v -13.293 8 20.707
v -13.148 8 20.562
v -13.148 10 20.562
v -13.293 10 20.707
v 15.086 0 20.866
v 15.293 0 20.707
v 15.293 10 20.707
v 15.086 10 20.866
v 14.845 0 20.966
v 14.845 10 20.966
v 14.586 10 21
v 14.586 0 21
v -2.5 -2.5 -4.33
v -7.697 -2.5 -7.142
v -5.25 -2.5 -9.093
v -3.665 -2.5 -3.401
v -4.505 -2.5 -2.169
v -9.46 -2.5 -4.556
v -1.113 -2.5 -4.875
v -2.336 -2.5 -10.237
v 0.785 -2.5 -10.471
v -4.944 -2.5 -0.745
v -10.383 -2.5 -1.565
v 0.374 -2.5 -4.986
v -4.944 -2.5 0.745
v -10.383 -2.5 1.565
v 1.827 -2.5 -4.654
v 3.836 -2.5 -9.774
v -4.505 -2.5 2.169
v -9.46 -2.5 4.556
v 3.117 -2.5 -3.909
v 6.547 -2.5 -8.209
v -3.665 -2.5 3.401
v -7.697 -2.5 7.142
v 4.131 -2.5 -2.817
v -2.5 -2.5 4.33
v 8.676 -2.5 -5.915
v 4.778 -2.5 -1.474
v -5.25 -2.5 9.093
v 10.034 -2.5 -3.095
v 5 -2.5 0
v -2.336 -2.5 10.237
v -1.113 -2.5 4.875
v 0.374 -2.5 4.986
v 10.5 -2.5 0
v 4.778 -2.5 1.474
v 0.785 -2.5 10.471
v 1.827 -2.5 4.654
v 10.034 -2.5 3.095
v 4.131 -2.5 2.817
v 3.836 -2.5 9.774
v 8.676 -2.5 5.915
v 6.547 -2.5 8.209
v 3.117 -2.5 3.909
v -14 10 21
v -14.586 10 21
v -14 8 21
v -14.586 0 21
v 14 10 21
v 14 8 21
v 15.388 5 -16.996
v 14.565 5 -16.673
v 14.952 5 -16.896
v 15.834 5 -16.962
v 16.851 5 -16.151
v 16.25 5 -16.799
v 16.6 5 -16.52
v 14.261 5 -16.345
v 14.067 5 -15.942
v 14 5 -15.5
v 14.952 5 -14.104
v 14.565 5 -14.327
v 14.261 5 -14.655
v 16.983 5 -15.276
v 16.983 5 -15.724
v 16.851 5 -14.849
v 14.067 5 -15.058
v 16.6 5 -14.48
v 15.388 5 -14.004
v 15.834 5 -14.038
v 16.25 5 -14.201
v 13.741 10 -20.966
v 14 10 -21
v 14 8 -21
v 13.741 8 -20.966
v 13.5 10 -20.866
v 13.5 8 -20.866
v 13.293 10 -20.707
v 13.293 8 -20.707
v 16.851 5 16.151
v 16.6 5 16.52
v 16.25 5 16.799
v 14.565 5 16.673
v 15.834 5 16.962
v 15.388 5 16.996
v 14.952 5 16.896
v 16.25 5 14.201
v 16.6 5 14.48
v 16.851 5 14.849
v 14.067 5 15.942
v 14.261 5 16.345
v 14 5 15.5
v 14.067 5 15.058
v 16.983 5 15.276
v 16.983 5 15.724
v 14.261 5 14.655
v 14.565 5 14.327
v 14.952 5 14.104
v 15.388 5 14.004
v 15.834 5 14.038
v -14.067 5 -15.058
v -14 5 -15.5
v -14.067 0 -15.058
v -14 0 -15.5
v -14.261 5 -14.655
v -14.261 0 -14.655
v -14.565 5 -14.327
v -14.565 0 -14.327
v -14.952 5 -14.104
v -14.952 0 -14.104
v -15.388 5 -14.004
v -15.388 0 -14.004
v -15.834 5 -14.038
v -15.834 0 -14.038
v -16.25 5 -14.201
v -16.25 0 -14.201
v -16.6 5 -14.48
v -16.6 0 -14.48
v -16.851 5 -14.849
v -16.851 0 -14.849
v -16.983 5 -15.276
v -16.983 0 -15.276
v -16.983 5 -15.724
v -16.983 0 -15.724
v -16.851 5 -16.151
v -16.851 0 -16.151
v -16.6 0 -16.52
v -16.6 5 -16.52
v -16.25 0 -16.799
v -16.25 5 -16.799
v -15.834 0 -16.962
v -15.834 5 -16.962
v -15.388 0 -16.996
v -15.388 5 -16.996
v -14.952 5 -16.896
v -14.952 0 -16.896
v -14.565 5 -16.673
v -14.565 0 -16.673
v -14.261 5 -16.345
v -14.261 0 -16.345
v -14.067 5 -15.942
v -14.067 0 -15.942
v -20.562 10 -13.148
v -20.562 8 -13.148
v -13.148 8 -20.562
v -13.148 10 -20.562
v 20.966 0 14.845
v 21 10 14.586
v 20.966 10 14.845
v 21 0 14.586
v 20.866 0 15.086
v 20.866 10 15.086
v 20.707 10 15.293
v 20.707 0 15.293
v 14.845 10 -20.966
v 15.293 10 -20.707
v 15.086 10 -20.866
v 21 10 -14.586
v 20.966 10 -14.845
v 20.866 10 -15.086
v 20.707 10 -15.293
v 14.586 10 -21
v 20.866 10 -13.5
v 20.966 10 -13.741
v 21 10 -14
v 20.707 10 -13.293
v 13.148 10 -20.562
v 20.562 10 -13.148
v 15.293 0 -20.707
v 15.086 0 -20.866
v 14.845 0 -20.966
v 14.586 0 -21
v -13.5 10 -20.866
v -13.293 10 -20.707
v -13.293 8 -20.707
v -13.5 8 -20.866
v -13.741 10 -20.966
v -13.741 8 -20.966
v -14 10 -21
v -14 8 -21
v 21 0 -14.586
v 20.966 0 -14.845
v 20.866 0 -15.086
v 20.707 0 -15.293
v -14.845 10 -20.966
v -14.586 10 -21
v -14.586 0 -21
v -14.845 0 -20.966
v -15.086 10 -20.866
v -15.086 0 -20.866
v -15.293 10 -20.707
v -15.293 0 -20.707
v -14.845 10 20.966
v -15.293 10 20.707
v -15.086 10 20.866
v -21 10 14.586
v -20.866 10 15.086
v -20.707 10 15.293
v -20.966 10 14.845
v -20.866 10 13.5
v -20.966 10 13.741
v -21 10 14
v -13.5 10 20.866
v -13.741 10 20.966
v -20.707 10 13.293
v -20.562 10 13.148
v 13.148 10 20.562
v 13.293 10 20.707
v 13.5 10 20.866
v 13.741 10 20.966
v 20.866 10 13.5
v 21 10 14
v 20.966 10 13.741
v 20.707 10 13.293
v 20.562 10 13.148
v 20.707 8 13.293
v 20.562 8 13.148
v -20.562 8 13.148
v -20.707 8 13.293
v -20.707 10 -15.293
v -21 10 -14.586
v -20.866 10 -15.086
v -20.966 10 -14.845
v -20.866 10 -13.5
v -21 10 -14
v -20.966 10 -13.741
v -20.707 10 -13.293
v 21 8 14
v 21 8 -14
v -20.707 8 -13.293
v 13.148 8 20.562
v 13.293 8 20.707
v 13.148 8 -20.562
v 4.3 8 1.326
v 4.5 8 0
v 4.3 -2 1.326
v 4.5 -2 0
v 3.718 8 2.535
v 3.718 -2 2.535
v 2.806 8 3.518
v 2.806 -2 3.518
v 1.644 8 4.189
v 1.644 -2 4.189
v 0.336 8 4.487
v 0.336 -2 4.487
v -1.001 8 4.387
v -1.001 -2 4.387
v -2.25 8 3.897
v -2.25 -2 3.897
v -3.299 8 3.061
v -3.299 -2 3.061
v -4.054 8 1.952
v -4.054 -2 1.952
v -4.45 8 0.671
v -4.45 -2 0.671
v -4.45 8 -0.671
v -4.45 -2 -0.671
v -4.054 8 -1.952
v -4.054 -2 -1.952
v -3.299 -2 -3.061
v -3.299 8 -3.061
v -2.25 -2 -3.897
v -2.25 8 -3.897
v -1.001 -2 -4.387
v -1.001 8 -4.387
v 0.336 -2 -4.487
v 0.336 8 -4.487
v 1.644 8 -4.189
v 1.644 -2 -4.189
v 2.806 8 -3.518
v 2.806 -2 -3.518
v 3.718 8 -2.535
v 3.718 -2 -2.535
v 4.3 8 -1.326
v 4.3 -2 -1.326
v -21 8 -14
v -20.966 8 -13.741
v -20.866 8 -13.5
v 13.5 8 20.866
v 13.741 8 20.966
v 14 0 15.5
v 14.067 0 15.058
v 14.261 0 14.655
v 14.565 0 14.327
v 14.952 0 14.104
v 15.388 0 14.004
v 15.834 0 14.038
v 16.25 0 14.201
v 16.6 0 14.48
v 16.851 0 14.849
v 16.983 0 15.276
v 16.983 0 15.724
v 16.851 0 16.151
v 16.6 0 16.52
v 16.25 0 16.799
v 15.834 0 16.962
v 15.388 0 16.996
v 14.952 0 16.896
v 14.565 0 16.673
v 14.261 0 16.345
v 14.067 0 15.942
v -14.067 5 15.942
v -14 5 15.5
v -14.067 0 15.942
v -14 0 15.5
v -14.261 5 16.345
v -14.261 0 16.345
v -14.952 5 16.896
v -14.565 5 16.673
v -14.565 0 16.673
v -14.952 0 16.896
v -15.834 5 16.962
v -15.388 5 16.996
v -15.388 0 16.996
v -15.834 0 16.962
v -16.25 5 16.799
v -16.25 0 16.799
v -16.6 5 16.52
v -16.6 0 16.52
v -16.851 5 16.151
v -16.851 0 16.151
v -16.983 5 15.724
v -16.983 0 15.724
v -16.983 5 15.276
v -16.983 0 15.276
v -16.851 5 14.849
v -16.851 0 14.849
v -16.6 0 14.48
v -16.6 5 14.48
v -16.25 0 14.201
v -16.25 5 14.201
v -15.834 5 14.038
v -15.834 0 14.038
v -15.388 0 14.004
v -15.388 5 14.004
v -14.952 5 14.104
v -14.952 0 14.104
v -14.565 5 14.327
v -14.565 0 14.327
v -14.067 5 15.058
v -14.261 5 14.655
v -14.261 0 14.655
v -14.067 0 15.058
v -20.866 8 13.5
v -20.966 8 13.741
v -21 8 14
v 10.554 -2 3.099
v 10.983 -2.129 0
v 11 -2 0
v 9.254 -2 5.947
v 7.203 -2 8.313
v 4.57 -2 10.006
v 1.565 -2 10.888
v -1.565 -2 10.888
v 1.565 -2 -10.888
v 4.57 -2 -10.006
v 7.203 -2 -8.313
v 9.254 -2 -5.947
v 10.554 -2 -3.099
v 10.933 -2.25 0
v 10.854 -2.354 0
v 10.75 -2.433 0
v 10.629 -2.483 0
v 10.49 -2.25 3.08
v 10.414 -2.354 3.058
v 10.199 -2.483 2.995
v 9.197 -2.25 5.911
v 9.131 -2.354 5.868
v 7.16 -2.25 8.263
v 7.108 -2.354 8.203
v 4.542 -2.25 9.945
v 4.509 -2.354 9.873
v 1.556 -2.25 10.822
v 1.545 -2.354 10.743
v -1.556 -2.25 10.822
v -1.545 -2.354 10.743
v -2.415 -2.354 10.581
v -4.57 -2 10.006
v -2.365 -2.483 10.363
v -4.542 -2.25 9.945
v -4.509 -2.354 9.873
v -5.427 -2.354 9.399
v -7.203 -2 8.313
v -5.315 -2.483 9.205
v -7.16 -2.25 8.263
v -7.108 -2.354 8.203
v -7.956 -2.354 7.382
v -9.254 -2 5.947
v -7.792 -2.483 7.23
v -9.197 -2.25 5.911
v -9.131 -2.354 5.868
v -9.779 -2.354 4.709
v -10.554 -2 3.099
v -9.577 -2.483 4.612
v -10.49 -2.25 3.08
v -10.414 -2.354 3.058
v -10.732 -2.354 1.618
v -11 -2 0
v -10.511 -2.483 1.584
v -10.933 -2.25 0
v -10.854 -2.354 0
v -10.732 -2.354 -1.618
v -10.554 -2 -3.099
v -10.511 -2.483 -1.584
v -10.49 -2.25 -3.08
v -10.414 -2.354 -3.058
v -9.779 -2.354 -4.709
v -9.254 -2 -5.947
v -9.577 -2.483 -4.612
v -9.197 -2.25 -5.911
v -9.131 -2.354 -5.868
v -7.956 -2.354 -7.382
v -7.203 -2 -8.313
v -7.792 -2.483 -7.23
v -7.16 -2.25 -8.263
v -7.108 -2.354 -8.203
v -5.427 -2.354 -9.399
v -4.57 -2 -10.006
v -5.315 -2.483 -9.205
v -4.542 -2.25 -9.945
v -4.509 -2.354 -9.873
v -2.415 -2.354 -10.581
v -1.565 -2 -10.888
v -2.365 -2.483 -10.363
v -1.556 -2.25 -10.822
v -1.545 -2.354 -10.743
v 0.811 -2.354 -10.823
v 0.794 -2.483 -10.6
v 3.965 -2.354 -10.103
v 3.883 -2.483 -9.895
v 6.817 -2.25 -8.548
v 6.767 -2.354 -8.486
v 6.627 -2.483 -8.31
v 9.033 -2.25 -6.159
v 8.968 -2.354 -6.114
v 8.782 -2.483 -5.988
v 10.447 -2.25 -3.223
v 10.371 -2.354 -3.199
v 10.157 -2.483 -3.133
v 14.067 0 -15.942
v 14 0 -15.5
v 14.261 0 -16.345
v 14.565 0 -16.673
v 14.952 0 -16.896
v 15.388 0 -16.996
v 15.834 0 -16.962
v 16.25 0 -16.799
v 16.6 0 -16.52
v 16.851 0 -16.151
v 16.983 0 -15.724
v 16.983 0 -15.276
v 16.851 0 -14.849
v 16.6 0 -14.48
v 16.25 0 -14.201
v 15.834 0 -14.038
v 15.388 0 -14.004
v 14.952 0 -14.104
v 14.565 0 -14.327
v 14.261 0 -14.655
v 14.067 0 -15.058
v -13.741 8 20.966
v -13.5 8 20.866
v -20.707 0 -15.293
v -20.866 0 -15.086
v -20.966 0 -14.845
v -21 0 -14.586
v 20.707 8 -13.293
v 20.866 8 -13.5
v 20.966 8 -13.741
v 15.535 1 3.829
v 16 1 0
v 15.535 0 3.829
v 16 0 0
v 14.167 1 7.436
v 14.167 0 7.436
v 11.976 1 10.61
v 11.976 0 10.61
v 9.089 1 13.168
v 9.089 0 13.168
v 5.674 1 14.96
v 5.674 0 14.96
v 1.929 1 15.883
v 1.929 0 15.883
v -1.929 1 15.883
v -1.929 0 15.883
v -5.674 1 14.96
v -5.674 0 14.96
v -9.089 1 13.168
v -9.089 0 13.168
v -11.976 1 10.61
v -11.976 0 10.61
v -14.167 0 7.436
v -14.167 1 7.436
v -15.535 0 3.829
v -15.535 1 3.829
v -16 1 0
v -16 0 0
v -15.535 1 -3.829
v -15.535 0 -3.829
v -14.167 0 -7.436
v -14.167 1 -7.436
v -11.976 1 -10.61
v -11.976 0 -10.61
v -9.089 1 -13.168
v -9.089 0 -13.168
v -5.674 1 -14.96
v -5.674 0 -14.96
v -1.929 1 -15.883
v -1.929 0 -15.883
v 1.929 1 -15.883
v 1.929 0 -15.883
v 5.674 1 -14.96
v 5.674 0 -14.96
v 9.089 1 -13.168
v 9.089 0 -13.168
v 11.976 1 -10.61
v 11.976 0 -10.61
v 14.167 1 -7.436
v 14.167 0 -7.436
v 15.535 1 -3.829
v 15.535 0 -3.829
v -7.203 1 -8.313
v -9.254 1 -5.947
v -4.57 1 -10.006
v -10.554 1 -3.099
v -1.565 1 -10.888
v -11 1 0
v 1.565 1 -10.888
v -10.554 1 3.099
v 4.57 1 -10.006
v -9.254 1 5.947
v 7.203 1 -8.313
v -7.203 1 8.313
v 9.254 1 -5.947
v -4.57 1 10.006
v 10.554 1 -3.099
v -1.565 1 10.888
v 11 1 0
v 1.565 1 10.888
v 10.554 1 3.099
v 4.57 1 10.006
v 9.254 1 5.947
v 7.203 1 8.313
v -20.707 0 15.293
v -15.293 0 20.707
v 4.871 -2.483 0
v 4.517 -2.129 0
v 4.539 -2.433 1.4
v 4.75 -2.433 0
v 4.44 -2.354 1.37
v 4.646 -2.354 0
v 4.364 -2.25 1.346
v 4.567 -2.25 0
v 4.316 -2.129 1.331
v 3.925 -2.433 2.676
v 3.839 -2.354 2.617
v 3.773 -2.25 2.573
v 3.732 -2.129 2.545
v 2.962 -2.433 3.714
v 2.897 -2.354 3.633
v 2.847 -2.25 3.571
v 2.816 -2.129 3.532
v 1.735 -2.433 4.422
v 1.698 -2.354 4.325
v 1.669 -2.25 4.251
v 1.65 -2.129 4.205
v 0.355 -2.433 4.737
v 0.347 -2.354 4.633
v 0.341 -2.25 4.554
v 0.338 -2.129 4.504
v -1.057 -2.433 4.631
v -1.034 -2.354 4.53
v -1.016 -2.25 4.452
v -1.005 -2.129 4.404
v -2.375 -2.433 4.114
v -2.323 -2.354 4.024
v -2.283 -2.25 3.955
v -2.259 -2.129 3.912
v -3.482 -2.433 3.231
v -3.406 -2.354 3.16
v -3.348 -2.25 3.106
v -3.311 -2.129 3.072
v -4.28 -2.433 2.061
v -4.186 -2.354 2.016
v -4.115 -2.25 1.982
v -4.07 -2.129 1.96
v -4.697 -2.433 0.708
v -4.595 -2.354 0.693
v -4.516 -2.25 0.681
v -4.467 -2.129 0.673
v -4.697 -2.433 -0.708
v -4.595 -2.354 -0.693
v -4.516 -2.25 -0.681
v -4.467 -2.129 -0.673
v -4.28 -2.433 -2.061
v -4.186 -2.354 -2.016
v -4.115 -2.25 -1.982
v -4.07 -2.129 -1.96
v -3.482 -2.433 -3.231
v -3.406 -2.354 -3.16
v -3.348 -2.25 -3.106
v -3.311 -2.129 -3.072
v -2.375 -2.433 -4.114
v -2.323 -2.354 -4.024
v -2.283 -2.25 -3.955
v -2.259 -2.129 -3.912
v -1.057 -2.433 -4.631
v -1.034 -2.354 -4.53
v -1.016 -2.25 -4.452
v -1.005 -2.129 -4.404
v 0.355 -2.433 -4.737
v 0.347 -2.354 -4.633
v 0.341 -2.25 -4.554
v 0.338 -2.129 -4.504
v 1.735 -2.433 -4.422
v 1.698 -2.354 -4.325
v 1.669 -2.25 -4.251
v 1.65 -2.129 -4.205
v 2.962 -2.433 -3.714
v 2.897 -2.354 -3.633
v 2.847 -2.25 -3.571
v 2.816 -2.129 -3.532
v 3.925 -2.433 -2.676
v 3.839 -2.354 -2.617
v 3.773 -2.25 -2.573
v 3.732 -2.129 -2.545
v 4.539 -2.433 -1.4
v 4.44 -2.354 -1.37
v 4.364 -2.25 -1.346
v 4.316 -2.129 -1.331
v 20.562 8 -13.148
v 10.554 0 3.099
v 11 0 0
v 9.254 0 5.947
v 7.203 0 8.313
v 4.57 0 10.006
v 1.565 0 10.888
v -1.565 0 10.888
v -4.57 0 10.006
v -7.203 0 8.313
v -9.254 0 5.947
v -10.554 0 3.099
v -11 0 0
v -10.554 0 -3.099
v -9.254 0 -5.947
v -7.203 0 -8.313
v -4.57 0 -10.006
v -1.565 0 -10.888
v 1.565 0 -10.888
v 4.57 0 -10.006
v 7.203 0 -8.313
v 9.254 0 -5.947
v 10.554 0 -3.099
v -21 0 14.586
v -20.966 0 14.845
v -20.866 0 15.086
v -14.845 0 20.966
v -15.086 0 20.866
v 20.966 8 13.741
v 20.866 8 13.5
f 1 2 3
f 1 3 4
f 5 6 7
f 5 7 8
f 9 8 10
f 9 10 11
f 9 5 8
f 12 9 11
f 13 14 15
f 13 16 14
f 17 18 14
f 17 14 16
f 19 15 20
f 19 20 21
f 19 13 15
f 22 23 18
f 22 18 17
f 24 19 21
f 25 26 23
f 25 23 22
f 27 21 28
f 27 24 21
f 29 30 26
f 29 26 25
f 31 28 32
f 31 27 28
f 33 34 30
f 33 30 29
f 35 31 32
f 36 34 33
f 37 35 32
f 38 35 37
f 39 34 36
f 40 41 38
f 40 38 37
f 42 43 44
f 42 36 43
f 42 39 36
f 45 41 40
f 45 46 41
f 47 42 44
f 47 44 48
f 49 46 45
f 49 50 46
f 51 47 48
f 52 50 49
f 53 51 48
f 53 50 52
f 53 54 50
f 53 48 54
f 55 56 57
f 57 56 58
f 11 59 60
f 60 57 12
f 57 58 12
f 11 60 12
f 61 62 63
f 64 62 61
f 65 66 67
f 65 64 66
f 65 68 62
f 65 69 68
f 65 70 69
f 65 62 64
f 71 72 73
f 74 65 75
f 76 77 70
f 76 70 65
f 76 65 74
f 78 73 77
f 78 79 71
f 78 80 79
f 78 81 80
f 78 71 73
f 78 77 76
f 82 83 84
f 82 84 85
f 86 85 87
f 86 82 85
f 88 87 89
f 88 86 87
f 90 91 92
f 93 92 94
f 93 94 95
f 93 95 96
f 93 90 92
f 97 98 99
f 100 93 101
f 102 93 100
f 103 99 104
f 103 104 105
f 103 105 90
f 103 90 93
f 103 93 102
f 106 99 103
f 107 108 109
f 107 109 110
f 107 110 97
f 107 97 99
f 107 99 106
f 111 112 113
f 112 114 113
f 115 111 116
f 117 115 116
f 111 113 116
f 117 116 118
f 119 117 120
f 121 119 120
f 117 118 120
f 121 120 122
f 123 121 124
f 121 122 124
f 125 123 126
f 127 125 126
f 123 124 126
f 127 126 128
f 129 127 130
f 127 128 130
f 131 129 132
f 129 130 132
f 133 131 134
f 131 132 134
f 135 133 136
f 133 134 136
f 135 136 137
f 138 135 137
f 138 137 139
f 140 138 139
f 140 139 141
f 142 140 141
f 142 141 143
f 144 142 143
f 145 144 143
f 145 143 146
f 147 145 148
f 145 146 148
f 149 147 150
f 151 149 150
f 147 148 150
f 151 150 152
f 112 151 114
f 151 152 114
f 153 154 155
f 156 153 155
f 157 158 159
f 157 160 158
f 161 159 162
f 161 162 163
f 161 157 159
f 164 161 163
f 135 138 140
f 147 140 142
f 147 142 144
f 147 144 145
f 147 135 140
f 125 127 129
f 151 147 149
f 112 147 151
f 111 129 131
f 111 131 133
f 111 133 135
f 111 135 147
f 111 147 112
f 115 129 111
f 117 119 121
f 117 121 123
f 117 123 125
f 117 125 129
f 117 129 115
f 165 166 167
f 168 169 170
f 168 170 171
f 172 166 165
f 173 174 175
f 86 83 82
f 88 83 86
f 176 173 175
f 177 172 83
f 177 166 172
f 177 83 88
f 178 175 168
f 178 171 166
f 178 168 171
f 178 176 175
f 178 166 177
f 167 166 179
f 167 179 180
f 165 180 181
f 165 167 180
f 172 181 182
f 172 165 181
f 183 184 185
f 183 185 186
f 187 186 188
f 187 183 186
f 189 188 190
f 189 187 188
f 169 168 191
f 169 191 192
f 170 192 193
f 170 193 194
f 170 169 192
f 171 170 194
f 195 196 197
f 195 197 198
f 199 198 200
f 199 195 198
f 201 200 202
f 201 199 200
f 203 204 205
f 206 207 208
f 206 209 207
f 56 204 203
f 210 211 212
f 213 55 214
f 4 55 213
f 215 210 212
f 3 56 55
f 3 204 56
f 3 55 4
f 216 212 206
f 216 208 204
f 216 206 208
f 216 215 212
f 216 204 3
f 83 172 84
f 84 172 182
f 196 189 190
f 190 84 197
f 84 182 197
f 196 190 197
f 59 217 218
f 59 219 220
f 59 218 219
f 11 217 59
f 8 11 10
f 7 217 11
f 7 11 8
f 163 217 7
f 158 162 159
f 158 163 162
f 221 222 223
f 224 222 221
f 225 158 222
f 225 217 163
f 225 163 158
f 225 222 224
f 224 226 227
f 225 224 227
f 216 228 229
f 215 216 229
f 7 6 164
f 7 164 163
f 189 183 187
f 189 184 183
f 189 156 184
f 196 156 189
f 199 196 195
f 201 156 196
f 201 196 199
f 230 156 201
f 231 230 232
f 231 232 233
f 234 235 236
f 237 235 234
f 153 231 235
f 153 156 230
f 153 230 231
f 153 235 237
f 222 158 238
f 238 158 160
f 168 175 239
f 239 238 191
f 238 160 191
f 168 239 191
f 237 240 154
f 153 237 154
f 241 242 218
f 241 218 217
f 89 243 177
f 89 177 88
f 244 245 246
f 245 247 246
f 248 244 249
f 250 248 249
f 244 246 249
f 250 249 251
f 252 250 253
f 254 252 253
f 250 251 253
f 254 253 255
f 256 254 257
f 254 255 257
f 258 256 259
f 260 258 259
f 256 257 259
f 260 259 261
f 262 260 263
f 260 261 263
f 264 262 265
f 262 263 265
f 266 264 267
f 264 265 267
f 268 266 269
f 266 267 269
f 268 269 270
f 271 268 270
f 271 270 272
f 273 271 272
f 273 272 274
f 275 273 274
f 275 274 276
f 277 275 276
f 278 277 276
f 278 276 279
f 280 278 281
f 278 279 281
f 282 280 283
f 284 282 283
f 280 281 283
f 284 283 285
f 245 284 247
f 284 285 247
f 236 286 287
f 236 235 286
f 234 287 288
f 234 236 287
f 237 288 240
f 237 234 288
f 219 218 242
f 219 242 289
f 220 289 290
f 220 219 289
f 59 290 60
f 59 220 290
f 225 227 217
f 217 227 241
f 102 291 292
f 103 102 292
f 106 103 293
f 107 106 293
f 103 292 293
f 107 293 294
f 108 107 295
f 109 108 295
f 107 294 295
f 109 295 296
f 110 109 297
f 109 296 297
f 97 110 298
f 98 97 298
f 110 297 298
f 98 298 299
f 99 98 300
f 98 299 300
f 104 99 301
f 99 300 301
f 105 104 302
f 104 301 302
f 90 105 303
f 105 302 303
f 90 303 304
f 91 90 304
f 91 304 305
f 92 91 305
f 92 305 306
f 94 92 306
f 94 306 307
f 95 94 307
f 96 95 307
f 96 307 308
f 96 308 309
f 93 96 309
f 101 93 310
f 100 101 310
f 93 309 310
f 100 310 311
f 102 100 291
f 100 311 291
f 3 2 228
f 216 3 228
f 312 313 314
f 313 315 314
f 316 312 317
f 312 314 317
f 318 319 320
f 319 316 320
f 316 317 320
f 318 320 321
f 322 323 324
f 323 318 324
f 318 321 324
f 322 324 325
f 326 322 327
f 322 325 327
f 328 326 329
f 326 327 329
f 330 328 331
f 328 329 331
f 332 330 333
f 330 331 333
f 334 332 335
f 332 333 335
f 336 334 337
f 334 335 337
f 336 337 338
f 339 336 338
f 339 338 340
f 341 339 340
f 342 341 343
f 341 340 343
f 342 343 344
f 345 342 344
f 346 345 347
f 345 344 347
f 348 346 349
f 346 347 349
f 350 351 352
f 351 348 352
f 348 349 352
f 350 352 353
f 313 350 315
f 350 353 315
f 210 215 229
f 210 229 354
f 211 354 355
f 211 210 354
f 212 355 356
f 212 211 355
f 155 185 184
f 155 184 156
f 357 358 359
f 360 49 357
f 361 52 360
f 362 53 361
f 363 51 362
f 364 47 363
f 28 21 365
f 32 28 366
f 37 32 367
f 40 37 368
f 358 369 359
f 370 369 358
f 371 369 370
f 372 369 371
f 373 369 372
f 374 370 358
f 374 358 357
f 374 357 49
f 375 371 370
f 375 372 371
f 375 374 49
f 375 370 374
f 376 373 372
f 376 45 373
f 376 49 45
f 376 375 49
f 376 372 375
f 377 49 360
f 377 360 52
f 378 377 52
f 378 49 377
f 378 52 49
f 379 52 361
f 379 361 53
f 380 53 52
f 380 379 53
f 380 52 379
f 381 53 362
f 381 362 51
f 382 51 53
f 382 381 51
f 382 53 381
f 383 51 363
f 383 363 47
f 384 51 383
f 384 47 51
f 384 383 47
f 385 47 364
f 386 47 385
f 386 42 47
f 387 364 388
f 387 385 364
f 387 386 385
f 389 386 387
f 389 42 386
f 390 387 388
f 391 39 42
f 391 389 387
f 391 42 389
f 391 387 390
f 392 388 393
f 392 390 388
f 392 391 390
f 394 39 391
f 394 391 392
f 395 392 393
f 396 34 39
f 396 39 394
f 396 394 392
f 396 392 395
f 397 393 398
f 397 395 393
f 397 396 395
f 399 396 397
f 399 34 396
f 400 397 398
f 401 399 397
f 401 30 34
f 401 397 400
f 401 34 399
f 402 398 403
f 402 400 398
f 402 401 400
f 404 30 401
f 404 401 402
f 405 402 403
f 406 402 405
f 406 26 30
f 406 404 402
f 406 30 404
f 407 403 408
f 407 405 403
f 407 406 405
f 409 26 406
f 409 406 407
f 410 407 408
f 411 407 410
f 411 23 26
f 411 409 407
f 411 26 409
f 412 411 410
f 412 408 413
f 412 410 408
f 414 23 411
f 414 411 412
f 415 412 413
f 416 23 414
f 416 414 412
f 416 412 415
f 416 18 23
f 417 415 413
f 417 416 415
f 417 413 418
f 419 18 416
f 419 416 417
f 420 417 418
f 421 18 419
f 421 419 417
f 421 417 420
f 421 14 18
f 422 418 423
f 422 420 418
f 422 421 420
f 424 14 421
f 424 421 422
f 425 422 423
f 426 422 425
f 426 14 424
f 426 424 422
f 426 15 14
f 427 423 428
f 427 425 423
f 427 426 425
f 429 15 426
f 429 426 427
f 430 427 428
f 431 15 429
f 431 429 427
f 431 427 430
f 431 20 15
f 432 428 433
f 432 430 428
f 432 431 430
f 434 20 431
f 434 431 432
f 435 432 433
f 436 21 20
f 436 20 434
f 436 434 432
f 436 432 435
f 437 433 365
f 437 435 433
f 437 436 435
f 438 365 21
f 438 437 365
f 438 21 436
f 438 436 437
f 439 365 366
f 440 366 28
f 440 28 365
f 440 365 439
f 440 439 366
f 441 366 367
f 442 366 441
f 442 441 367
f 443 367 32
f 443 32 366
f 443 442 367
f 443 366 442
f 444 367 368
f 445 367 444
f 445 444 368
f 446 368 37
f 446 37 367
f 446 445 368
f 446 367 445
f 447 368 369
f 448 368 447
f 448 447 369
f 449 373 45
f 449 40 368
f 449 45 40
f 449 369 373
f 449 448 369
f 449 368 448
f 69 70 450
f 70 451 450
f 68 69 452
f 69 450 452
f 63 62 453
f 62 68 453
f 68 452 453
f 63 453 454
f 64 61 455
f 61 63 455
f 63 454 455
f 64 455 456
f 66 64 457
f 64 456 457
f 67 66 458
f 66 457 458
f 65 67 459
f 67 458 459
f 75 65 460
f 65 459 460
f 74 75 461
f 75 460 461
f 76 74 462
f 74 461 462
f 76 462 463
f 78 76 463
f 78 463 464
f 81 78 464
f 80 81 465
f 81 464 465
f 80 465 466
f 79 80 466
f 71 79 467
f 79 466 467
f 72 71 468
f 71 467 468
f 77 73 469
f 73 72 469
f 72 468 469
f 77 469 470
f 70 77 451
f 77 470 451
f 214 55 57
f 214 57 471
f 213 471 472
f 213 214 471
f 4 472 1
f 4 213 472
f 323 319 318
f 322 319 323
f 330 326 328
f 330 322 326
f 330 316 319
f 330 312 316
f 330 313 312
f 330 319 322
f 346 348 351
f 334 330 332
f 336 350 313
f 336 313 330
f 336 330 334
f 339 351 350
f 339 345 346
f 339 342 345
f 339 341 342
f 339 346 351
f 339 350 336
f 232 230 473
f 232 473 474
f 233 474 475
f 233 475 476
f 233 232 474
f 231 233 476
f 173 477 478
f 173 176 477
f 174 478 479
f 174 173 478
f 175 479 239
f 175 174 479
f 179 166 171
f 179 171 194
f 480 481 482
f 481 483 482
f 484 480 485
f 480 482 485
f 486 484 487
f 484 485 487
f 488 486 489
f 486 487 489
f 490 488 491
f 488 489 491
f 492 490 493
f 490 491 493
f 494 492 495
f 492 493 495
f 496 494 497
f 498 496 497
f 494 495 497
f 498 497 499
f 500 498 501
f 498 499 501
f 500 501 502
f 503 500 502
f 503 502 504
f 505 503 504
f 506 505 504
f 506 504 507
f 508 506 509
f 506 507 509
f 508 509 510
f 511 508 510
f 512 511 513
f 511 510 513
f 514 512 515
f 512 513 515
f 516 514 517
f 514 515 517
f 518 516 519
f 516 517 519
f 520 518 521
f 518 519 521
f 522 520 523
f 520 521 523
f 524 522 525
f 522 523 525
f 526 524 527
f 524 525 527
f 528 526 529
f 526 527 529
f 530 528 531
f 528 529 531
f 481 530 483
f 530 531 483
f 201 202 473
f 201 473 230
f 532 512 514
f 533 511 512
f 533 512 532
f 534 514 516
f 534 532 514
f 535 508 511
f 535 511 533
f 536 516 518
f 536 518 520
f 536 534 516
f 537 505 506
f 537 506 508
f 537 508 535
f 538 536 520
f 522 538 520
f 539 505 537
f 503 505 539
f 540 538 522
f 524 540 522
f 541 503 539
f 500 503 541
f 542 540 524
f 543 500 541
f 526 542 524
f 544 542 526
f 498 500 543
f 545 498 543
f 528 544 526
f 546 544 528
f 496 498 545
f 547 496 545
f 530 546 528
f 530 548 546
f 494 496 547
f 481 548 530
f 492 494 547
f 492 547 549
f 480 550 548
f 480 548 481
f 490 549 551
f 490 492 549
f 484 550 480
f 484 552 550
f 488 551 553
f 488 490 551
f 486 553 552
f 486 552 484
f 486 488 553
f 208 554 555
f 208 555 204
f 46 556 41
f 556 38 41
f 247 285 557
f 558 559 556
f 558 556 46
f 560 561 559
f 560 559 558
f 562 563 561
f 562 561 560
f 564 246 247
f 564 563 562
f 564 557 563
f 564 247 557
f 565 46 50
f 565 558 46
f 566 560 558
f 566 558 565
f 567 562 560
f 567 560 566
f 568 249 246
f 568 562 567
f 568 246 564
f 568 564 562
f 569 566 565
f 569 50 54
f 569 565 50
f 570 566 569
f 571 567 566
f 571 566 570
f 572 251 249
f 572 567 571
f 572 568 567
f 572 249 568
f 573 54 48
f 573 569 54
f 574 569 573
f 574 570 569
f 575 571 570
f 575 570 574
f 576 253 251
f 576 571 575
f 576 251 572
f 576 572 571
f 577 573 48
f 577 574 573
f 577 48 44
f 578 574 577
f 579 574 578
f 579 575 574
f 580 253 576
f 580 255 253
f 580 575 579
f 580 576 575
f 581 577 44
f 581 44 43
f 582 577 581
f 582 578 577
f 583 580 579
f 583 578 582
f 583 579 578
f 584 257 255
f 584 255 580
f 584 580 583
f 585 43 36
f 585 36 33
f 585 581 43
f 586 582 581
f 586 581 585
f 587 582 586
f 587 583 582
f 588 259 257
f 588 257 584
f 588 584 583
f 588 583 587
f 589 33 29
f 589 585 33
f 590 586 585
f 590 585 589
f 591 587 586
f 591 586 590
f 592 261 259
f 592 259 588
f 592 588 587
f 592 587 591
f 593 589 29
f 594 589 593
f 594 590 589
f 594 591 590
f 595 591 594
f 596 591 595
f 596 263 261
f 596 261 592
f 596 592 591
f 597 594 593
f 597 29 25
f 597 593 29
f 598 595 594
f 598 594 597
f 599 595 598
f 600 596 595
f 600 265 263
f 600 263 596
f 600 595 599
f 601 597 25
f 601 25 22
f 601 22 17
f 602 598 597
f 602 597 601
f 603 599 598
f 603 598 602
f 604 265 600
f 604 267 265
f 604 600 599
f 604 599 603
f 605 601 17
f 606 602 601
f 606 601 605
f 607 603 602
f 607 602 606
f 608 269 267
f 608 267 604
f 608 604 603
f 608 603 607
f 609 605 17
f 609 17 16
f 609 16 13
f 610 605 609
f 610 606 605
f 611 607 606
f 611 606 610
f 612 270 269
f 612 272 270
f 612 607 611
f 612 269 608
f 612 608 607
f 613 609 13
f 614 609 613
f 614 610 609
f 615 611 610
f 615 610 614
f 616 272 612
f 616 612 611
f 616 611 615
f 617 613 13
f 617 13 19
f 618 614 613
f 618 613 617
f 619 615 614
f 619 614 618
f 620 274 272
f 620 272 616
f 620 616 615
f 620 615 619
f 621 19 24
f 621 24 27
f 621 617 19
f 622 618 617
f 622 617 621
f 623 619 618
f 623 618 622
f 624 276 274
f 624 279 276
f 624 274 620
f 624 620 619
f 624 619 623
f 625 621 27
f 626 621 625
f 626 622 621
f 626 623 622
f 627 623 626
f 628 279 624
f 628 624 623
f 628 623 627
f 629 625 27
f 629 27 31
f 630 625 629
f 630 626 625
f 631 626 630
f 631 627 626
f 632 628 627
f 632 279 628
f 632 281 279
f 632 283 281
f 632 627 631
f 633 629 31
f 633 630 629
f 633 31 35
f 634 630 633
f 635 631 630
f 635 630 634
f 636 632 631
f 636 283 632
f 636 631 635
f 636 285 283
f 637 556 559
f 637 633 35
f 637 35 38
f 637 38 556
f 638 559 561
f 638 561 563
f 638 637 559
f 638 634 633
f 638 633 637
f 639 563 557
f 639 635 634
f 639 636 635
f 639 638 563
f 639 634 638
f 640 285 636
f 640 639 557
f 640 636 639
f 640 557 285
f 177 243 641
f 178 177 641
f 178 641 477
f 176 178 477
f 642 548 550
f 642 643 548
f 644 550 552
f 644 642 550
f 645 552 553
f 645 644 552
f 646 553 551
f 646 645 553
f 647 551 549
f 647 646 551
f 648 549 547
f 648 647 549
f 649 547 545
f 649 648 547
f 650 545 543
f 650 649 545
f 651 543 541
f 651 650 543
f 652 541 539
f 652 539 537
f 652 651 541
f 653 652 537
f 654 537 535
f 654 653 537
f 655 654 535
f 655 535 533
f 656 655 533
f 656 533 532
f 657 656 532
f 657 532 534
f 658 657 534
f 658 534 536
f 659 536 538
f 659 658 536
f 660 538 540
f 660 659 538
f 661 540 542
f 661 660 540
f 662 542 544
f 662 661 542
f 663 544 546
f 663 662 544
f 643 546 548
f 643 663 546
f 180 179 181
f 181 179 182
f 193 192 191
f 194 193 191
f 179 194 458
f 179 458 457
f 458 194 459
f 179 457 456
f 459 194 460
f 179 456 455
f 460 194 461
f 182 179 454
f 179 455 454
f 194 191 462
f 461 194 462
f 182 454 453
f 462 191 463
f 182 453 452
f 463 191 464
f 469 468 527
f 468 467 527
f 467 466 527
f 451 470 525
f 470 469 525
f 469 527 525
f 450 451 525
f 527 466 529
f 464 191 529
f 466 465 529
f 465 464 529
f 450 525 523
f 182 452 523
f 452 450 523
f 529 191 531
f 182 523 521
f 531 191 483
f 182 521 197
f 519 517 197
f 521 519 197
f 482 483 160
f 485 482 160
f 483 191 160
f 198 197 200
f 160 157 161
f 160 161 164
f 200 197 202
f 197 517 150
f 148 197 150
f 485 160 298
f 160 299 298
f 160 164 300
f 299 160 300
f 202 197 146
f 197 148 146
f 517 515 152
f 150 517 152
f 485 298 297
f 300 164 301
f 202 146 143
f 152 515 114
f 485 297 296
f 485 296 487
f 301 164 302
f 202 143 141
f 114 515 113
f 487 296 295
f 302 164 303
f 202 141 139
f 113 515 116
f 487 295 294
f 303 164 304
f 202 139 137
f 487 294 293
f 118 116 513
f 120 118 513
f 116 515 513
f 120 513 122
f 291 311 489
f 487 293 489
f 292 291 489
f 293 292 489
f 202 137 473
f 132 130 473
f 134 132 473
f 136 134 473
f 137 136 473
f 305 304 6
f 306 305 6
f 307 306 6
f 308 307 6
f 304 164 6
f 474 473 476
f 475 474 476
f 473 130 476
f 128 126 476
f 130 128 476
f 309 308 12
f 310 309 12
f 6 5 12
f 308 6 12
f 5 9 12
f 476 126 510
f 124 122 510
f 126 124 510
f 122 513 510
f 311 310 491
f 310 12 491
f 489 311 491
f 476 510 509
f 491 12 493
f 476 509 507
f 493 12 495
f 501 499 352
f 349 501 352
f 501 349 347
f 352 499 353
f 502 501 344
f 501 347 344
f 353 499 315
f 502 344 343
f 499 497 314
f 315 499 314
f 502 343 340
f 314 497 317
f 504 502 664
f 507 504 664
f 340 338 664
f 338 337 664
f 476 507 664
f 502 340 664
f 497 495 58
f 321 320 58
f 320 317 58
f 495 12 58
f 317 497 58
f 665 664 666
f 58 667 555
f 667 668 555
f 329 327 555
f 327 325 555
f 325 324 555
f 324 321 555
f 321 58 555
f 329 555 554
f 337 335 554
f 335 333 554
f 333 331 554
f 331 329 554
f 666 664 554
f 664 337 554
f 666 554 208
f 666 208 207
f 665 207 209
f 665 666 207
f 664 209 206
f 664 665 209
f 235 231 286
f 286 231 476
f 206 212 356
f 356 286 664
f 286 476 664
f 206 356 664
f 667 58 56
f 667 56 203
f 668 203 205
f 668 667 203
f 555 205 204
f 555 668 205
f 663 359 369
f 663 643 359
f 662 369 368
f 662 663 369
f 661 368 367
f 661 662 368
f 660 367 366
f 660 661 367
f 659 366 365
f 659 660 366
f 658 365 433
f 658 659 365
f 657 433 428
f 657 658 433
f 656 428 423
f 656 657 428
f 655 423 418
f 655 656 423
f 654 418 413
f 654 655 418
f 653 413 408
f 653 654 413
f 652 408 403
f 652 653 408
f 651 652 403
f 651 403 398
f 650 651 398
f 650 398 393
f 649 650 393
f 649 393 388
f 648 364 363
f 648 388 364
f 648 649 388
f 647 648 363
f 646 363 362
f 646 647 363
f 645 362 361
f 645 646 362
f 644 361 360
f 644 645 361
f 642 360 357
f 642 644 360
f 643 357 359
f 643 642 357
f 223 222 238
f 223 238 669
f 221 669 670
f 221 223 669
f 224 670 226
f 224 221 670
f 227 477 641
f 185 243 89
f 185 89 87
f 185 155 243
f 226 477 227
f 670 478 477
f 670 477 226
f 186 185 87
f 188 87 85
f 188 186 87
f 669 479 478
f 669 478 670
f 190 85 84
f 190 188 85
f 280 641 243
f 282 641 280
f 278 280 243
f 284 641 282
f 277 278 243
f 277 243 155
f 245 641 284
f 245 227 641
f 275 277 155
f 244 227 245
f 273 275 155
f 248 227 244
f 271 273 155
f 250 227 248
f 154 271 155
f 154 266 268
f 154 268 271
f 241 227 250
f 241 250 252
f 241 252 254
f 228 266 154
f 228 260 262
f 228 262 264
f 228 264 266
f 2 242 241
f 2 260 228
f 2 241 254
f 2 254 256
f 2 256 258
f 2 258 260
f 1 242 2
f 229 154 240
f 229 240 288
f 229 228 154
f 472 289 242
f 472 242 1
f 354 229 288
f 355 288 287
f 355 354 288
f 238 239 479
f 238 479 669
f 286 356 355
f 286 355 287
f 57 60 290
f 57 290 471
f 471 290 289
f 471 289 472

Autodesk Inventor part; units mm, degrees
ref_plane "YZ Plane" through (0, 0, 0) normal (1, 0, 0) x (0, 1, 0)
ref_plane "XZ Plane" through (0, 0, 0) normal (0, 1, 0) x (-1, 0, 0)
ref_plane "XY Plane" through (0, 0, 0) normal (0, 0, 1) x (1, 0, 0)
sketch "Sketch1" plane through (0, 0, 0) normal (0, 1, 0) x (-1, 0, 0)
  line L0 (-21, -21) -> (21, -21)
  line L1 (21, -21) -> (21, 21)
  line L2 (21, 21) -> (-21, 21)
  line L3 (-21, 21) -> (-21, -21)
  line L4 (-21, -21) -> (21, 21) construction
  line L5 (21, -21) -> (-21, 21) construction
  point P0 (0, 0)
  dimension "d0" = 42
  dimension "d1" = 42
extrude "Extrusion1" add sketch "Sketch1" along normal blind 8
sketch "Sketch2" plane through (0, 0, 0) normal (0, -1, 0) x (1, 0, 0)
  point P0 (0, 0)
chamfer "Chamfer1" distance 6 angle 45 4 edges at (-21, 4, 21) (21, 4, 21) (21, 4, -21) (-21, 4, -21)
sketch "Sketch3" plane through (0, 8, 0) normal (0, 1, 0) x (1, 0, 0)
  line L0 (-21, 15) -> (-15, 21) projected
  line L1 (-21, 15) -> (-21, -15) projected
  line L2 (-15, -21) -> (-21, -15) projected
  line L3 (-15, -21) -> (15, -21) projected
  line L4 (21, -15) -> (15, -21) projected
  line L5 (21, -15) -> (21, 15) projected
  line L6 (15, 21) -> (21, 15) projected
  line L7 (15, 21) -> (-15, 21) projected
  line L8 (-19.6609, -14.0495) -> (-13.6609, -20.0495)
  line L9 (-15, -21) -> (-21, -15) projected
  line L10 (-21, -15) -> (-19.8552, -13.8552)
  line L11 (-19.8552, -13.8552) -> (-19.6609, -14.0495)
  line L12 (-15, -21) -> (-13.8552, -19.8552)
  line L13 (-13.6609, -20.0495) -> (-13.1481, -20.5623)
  line L14 (-13.1481, -20.5623) -> (-13.5858, -21)
  line L15 (-19.8552, -13.8552) -> (-20.5623, -13.1481)
  line L16 (-20.5623, -13.1481) -> (-21, -13.5858)
  point P0 (0, 0)
  dimension "d11" = 1
  dimension "d12" = 1
extrude "Extrusion2" add sketch "Sketch3" along normal blind 2 contours L16 L15 L10 L1 | L10 L11 L8 L12 L2 | L12 L8 L13 L14 L3
mirror "Mirror1" about plane through (0, 0, 0) normal (0, 0, 1) of "Extrusion2"
mirror "Mirror2" about plane through (0, 0, 0) normal (1, 0, 0) of "Extrusion2", "Mirror1"
fillet "Fillet2" radius 1 8 edges at (15, 5, -21) (21, 5, -15) (21, 5, 15) (15, 5, 21) (-15, 5, 21) (-21, 5, 15) (-21, 5, -15) (-15, 5, -21)
fillet "Fillet3" radius 1 8 edges at (-21, 9, 13.5858) (-13.5858, 9, 21) (13.5858, 9, 21) (21, 9, 13.5858) (21, 9, -13.5858) (13.5858, 9, -21) (-13.5858, 9, -21) (-21, 9, -13.5858)
sketch "Sketch4" plane through (0, 0, 0) normal (0, -1, 0) x (1, 0, 0)
  circle A0 centre (0, 0) radius 16
  circle A1 centre (0, 0) radius 11
  dimension "d14" = 32
  dimension "d15" = 22
extrude "Extrusion3" cut sketch "Sketch4" against normal blind 1
sketch "Sketch5" plane through (0, 0, 0) normal (0, -1, 0) x (1, 0, 0)
  circle A0 centre (0, 0) radius 11 projected
extrude "Extrusion4" add sketch "Sketch5" along normal blind 2.5
sketch "Sketch6" plane through (0, -2.5, 0) normal (0, -1, 0) x (1, 0, 0)
  circle A0 centre (0, 0) radius 4.5
  dimension "d20" = 9
extrude "Extrusion5" cut sketch "Sketch6" against normal up to surface (10.5 mm away)
sketch "Sketch7" plane through (0, 0, 0) normal (0, -1, 0) x (1, 0, 0)
  point P0 (0, 0)
sketch "Sketch8" plane through (0, 0, 0) normal (0, -1, 0) x (1, 0, 0)
  circle A0 centre (-15.5, -15.5) radius 1.5
  line L0 (14.5858, -21) -> (-14.5858, -21) projected
  line L1 (-21, -14.5858) -> (-21, 14.5858) projected
  point P0 (0, 0)
  dimension "d23" = 3
  dimension "d24" = 5.5
  dimension "d25" = 5.5
extrude "Extrusion6" cut sketch "Sketch8" against normal blind 5
mirror "Mirror3" about plane through (0, 0, 0) normal (0, 0, 1) of "Extrusion6"
mirror "Mirror4" about plane through (0, 0, 0) normal (1, 0, 0) of "Extrusion6", "Mirror3"
fillet "Fillet4" radius 0.5 1 edges at (-11, -2.5, 0)
fillet "Fillet5" radius 0.5 1 edges at (-4.5, -2.5, 0)
equation "\"d12\" = d11"
equation "\"d25\" = d24"
